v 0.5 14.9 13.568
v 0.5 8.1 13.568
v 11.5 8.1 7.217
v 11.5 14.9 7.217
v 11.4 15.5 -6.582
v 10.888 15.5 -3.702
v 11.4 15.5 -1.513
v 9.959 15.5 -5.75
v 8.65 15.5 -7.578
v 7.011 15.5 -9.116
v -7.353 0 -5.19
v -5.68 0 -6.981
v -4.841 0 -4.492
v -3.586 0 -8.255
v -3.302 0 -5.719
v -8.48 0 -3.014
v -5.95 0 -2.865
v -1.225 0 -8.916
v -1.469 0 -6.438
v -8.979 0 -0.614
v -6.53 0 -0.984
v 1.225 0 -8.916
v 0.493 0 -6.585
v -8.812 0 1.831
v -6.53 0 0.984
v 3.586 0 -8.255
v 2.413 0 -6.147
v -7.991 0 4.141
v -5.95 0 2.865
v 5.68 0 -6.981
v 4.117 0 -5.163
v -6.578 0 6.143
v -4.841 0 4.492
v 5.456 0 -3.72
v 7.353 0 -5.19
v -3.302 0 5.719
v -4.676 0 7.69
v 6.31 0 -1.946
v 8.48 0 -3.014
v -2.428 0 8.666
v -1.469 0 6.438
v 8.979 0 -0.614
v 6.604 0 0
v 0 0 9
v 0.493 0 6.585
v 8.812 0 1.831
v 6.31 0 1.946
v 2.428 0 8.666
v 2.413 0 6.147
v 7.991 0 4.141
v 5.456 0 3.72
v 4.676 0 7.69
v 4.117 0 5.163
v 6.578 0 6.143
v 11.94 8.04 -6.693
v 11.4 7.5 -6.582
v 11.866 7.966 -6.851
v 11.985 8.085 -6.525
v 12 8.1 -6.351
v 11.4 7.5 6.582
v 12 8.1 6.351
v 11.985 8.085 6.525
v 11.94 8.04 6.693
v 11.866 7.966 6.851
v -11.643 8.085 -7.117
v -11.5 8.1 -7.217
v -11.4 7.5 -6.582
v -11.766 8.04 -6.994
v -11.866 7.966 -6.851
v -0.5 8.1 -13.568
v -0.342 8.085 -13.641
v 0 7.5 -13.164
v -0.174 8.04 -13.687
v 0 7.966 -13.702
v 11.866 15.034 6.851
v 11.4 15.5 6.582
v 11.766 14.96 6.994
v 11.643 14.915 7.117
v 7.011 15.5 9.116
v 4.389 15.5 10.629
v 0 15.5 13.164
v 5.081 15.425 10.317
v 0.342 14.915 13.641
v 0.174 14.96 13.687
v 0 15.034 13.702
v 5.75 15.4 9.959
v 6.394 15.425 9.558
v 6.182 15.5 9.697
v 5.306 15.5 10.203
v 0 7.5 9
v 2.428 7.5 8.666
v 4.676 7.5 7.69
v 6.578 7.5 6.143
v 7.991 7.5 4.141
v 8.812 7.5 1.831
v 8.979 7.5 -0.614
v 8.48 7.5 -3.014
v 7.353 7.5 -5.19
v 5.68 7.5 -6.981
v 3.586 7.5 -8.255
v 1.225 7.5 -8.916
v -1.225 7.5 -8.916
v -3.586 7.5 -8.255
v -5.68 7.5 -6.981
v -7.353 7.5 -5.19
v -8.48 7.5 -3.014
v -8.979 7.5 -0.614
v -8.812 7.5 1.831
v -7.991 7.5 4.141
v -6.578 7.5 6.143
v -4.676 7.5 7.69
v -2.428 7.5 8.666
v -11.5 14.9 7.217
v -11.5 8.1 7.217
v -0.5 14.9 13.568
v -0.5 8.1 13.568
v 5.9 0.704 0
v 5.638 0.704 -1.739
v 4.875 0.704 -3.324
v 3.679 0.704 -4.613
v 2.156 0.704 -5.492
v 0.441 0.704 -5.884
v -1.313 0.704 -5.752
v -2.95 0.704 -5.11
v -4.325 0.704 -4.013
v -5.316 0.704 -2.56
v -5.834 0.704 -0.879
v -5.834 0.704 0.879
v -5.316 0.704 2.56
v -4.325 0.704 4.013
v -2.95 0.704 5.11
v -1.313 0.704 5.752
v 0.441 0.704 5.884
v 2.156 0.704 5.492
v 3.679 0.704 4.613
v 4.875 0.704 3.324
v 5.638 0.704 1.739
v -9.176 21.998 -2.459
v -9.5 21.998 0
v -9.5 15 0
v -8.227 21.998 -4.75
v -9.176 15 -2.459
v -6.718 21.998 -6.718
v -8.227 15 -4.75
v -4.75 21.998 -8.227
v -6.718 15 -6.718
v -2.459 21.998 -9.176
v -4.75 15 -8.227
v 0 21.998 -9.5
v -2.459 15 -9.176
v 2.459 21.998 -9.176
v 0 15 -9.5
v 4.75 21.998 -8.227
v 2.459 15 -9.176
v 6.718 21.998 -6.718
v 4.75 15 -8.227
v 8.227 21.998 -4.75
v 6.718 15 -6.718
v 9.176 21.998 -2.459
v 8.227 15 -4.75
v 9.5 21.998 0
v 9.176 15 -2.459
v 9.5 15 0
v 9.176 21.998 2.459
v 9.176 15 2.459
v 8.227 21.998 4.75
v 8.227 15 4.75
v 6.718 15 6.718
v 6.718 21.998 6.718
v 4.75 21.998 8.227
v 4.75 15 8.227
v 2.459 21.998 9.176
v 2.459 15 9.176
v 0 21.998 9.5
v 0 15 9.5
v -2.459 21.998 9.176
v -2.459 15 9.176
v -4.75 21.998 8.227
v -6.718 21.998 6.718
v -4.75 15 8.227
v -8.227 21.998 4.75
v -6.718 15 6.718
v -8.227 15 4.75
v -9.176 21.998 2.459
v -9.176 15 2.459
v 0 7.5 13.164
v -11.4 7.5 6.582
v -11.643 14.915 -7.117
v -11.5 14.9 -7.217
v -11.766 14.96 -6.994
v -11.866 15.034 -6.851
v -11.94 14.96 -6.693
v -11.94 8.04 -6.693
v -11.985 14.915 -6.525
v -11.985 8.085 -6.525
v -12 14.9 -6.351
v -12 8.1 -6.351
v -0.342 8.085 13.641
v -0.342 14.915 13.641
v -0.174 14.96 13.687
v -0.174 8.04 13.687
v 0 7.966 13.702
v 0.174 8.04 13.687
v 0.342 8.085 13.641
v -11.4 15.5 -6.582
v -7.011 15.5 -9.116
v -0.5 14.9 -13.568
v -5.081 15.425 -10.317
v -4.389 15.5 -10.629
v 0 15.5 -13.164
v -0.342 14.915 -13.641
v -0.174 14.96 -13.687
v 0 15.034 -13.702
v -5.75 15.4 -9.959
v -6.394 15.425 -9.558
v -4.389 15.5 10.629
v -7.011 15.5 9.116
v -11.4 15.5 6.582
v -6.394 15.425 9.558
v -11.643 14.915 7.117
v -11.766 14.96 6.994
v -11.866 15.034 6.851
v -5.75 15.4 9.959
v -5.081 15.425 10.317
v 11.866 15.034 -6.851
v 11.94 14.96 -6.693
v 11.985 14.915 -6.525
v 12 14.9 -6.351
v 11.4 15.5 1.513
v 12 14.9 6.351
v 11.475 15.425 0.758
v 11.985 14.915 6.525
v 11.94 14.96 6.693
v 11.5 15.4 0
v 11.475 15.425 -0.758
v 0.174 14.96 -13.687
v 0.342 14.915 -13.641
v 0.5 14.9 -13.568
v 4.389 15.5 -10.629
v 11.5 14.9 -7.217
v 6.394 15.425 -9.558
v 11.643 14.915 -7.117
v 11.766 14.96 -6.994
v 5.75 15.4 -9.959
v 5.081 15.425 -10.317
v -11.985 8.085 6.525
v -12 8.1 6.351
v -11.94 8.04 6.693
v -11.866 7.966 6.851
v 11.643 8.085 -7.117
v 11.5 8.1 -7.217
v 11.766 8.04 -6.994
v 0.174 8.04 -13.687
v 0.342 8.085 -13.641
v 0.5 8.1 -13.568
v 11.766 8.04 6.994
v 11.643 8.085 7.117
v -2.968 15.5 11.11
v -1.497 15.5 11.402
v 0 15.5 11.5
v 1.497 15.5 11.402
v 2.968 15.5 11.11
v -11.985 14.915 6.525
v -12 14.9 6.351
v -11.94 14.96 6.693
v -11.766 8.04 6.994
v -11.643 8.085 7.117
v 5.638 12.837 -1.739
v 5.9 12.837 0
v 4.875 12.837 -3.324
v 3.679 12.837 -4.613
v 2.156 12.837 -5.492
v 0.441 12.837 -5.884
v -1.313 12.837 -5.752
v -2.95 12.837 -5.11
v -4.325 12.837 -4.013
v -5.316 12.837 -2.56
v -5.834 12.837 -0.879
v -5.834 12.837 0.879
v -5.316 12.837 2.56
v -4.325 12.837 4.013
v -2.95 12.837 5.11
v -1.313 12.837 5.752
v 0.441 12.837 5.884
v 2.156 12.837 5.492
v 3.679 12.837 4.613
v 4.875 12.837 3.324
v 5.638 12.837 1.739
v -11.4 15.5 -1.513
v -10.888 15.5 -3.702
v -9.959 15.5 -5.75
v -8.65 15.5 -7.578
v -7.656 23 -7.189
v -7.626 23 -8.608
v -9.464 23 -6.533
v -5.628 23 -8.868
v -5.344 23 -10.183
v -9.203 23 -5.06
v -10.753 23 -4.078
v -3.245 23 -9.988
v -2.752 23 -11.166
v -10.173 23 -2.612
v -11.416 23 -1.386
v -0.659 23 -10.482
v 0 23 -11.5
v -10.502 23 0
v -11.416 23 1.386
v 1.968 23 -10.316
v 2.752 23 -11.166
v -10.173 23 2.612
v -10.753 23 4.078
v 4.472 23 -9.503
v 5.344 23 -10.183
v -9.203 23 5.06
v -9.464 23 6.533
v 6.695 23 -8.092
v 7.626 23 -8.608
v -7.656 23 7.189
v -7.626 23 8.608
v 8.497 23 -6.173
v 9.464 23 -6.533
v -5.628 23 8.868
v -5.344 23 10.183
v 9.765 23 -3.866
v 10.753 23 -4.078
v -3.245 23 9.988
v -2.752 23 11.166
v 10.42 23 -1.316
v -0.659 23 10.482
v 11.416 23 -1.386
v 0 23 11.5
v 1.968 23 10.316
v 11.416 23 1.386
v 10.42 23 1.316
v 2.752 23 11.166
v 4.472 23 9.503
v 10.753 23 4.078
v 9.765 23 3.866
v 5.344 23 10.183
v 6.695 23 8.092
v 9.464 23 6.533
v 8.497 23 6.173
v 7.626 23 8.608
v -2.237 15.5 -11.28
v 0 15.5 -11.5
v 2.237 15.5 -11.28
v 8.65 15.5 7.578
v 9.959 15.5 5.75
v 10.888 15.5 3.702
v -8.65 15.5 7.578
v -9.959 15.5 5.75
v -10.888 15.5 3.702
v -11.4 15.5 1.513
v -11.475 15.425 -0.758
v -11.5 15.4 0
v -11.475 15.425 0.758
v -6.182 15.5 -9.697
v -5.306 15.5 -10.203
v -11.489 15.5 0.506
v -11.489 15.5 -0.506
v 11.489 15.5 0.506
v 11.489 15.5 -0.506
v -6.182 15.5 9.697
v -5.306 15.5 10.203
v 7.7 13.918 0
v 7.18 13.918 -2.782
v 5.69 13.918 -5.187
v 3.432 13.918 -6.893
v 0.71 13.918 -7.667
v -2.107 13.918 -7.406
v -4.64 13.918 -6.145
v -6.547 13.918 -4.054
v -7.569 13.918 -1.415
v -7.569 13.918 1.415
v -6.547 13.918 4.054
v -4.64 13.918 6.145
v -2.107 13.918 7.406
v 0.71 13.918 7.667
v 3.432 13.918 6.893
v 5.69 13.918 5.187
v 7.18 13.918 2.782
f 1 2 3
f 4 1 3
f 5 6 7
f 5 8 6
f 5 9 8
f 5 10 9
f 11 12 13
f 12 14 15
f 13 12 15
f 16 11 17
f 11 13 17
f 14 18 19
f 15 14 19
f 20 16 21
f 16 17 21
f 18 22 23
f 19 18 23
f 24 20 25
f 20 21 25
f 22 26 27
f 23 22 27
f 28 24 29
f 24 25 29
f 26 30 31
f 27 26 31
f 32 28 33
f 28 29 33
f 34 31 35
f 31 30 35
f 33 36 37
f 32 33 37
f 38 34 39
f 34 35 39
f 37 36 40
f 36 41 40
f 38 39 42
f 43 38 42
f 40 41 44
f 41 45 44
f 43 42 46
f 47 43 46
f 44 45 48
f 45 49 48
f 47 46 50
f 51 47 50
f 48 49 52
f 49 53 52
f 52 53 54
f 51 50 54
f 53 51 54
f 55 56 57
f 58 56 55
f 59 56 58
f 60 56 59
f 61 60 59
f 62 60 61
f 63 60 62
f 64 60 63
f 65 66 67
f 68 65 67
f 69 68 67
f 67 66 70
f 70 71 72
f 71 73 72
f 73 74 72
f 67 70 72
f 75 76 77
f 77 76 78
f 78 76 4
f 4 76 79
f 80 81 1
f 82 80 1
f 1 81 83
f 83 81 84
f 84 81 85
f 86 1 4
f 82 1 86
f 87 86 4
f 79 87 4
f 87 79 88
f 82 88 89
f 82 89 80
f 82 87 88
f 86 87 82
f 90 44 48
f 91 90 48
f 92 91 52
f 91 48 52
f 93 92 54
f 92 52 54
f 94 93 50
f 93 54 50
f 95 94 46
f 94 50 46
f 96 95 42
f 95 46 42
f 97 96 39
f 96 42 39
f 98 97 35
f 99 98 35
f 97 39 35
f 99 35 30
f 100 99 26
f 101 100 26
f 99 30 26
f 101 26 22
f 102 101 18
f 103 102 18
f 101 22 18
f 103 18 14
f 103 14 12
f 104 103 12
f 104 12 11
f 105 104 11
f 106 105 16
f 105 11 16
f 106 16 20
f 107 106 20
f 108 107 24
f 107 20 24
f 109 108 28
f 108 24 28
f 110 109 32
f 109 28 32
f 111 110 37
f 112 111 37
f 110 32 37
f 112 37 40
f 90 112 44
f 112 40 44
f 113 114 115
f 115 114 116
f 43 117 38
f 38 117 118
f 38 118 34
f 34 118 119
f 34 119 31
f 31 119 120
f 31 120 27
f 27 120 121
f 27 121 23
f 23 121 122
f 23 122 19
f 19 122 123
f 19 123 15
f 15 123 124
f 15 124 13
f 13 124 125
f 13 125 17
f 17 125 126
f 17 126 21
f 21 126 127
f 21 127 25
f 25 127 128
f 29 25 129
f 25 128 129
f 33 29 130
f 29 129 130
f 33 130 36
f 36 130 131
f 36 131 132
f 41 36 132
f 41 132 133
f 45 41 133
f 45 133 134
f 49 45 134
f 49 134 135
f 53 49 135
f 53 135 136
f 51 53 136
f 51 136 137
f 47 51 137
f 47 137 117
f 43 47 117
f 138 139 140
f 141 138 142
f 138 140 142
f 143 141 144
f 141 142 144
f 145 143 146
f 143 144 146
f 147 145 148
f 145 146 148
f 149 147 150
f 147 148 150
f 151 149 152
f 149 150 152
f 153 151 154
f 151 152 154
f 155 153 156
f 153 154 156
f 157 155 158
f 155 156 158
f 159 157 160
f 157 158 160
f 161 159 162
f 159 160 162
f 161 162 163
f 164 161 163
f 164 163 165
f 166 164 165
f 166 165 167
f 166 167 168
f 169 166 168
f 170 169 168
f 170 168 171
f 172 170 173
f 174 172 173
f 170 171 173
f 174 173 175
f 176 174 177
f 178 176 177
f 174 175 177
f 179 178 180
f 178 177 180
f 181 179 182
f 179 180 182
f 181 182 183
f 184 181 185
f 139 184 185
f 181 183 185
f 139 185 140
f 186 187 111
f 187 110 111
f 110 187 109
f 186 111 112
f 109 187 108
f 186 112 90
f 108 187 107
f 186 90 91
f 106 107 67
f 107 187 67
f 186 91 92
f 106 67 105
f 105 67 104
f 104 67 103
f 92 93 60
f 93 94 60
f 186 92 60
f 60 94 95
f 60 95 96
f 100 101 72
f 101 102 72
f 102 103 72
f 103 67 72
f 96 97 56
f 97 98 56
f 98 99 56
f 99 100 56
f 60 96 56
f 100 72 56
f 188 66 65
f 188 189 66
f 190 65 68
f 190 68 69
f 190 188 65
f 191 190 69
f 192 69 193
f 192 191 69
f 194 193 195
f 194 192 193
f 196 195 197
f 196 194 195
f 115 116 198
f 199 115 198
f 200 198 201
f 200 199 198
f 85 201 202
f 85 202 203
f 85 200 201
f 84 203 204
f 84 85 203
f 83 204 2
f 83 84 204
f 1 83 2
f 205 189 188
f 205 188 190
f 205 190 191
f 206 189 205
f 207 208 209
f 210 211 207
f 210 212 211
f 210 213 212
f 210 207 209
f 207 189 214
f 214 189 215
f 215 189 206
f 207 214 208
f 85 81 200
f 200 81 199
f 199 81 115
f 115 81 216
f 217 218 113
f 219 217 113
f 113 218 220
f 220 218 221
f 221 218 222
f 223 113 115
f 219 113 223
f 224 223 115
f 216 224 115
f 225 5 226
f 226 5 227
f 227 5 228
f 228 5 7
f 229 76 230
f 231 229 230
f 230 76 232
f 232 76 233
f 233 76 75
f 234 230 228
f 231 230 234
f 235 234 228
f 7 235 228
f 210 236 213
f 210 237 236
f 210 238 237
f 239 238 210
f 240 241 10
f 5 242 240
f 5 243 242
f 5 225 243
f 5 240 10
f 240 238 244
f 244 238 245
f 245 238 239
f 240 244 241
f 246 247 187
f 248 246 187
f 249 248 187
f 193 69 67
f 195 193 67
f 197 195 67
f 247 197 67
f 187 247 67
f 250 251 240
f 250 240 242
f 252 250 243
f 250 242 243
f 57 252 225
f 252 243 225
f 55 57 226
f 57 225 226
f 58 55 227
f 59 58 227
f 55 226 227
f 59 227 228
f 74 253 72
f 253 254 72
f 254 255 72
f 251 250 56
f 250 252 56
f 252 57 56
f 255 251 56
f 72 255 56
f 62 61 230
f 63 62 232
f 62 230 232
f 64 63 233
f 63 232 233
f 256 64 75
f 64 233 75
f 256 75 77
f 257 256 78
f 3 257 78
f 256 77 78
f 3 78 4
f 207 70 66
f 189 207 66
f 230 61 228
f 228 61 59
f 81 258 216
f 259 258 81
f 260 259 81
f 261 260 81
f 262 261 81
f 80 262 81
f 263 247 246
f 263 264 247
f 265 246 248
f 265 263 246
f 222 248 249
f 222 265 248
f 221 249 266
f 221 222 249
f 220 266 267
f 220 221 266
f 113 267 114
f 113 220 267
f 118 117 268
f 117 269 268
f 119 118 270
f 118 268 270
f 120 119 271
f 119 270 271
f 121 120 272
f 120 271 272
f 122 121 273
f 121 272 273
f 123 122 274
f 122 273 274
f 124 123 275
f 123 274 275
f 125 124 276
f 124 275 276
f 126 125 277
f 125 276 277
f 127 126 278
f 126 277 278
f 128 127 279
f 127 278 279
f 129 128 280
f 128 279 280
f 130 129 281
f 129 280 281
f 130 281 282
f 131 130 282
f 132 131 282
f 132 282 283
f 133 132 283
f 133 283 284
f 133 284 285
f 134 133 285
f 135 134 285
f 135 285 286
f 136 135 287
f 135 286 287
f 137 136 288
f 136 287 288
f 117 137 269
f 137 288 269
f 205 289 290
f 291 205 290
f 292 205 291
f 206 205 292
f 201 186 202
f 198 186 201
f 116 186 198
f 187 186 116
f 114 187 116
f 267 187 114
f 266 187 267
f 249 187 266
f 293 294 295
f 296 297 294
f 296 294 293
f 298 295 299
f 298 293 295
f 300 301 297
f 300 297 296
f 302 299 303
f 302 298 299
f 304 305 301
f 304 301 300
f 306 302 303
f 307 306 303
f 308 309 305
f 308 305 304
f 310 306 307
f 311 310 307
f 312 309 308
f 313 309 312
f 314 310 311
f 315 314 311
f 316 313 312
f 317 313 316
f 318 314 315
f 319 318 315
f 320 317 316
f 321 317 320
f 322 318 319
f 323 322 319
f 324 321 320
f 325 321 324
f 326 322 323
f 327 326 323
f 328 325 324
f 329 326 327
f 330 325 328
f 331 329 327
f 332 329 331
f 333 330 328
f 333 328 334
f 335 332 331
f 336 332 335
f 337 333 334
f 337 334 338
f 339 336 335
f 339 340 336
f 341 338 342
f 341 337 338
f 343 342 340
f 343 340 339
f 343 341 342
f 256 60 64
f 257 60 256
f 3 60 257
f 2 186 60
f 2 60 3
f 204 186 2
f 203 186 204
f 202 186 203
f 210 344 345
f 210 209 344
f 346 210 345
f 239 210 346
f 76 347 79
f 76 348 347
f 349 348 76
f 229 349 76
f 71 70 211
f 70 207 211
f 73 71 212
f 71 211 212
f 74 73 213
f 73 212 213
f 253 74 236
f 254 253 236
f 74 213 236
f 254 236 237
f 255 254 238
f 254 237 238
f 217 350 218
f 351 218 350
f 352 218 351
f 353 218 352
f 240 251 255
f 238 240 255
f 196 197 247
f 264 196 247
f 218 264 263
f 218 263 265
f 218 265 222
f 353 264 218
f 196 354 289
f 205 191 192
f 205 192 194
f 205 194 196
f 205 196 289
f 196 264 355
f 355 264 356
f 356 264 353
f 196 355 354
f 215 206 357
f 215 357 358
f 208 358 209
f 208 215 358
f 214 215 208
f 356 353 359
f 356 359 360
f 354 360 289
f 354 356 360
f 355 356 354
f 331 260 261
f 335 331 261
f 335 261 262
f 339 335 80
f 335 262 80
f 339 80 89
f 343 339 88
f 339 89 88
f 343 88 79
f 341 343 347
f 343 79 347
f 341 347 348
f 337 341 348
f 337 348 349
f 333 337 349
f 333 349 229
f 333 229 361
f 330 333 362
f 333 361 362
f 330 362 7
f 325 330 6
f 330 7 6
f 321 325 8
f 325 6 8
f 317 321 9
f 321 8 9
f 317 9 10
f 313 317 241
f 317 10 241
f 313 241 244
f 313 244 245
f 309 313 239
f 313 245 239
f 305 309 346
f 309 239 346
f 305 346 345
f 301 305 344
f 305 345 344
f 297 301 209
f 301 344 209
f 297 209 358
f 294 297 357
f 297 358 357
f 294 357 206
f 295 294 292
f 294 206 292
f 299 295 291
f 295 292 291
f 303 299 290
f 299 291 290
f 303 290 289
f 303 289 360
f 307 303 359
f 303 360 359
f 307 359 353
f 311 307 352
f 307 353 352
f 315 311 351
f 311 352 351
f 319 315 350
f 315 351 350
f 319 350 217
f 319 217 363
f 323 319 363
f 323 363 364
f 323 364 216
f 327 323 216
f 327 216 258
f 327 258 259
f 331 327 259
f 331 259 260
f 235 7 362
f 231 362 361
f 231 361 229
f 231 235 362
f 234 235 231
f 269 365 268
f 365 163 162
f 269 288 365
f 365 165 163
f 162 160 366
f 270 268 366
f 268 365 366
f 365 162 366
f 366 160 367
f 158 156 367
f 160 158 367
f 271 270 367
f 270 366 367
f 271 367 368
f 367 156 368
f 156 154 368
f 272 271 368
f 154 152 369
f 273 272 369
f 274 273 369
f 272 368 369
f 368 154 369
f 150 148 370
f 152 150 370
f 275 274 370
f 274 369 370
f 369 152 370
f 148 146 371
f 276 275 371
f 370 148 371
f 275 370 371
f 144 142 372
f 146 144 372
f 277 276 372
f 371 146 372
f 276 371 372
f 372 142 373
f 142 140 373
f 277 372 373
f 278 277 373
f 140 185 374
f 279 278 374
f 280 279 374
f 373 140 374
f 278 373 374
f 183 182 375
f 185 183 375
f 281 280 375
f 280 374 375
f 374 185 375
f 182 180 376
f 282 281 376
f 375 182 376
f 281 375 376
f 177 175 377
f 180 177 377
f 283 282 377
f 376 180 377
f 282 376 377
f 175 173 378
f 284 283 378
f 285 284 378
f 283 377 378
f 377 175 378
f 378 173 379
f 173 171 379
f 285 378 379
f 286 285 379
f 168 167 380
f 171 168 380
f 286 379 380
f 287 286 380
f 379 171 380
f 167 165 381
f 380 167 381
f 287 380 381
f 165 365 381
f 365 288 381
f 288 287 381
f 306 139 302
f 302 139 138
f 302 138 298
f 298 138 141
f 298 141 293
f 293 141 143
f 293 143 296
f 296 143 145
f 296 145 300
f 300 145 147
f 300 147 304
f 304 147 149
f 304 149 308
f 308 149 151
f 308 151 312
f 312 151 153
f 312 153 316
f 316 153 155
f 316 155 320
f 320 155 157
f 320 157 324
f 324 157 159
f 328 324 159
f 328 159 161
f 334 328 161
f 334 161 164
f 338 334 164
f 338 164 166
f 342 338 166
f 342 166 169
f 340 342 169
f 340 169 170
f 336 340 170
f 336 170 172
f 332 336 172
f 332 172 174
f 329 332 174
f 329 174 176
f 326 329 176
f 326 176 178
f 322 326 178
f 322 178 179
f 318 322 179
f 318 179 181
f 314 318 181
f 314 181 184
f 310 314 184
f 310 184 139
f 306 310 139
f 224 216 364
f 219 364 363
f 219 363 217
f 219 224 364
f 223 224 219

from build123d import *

# Parameters (mm, degrees)
SKETCH_1_R                    = 9
EXTRUDE_1_DEPTH               = 7.5
EXTRUDE_2_DEPTH               = 8
SKETCH_3_R                    = 11.5
EXTRUDE_3_DEPTH               = 7.5
CHAMFER_2_SIZE                = 0.6
FILLET_1_R                    = 1
HOLE_WIZARD_G1_22_D           = 19
HOLE_WIZARD_G1_22_DEPTH       = 8
HOLE_WIZARD_G1_22_CSINK_D     = 21.005
HOLE_WIZARD_G1_22_CSINK_ANGLE = 90
HOLE_WIZARD_G1_22_TIP         = 5.708175880761822
HOLE_WIZARD_G1_41_D           = 11.8
HOLE_WIZARD_G1_41_DEPTH       = 30.32
HOLE_WIZARD_G1_41_CSINK_D     = 13.207
HOLE_WIZARD_G1_41_CSINK_ANGLE = 90
HOLE_WIZARD_G1_41_TIP         = 3.5450776522626057


with BuildPart() as part:
    # Эскиз1 → Бобышка-Вытянуть1 (new body)
    with BuildSketch(Plane(origin=(0, 0, 0), x_dir=(1, 0, 0), z_dir=(0, 1, 0))):
        with Locations(Location((0, 0, 0), (0, 0, 270))):
            Circle(SKETCH_1_R)
    extrude(amount=EXTRUDE_1_DEPTH)

    # Эскиз2 → Бобышка-Вытянуть2 (add)
    with BuildSketch(Plane(origin=(0, 7.5, 0), x_dir=(1, 0, 0), z_dir=(0, 1, 0))):
        Polygon((-3.47e-15, 13.856406460551018), (-12, 6.92820323027551), (-11.999999999999996, -6.9282032302755105), (1.63e-15, -13.856406460551016), (12, -6.928203230275508), (11.999999999999993, 6.928203230275516), align=None)
    extrude(amount=EXTRUDE_2_DEPTH)

    # Эскиз3 → Бобышка-Вытянуть3 (add)
    with BuildSketch(Plane(origin=(0, 15.5, 0), x_dir=(1, 0, 0), z_dir=(0, 1, 0))):
        with Locations(Location((0, 0, 0), (0, 0, 270))):
            Circle(SKETCH_3_R)
    extrude(amount=EXTRUDE_3_DEPTH)

    # Фаска2
    # the kernel refuses this chamfer: 0.6 mm, written as the material it takes off along each edge
    with BuildSketch(Plane(origin=(13.336285678835246, 7.5, -6.156698333885741), x_dir=(0.01374793830529287, 0.9996219169112968, -0.023812127644089635), z_dir=(-0.8660254037844389, 0, -0.4999999999999997))) as chamfer_2_piece_1:
        Polygon((CHAMFER_2_SIZE * 0.999621916911, -CHAMFER_2_SIZE * 0.0274958766106), (-CHAMFER_2_SIZE * 0.0274958766106, -CHAMFER_2_SIZE * 0.999621916911), (0, 0), align=None)
    extrude(amount=16.942426046110114, mode=Mode.SUBTRACT)
    with BuildSketch(Plane(origin=(1.3362856788352484, 7.5, -14.627911356940793), x_dir=(-0.013747938305293587, 0.9996219169112968, -0.023812127644090856), z_dir=(-0.8660254037844387, 0, 0.5000000000000001))) as chamfer_2_piece_2:
        Polygon((CHAMFER_2_SIZE * 0.999621916911, -CHAMFER_2_SIZE * 0.0274958766106), (-CHAMFER_2_SIZE * 0.0274958766106, -CHAMFER_2_SIZE * 0.999621916911), (0, 0), align=None)
    extrude(amount=16.942426046110114, mode=Mode.SUBTRACT)
    with BuildSketch(Plane(origin=(-12, 7.5, -8.471213023055057), x_dir=(-0.027495876610587344, 0.9996219169112968, 0), z_dir=(2.6e-16, 0, 1))) as chamfer_2_piece_3:
        Polygon((CHAMFER_2_SIZE * 0.999621916911, -CHAMFER_2_SIZE * 0.0274958766106), (-CHAMFER_2_SIZE * 0.0274958766106, -CHAMFER_2_SIZE * 0.999621916911), (0, 0), align=None)
    extrude(amount=16.942426046110118, mode=Mode.SUBTRACT)
    with BuildSketch(Plane(origin=(-13.33628567883525, 7.5, 6.1566983338857355), x_dir=(0.4998109584556482, -0.027495876610585928, -0.8656979742248805), z_dir=(0.8660254037844387, 0, 0.49999999999999983))) as chamfer_2_piece_4:
        Polygon((CHAMFER_2_SIZE * 0.999621916911, CHAMFER_2_SIZE * 0.0274958766106), (-CHAMFER_2_SIZE * 0.0274958766106, CHAMFER_2_SIZE * 0.999621916911), (0, 0), align=None)
    extrude(amount=16.942426046110118, mode=Mode.SUBTRACT)
    with BuildSketch(Plane(origin=(-1.3362856788352513, 7.5, 14.62791135694079), x_dir=(-0.49981095845564827, -0.027495876610585855, -0.8656979742248804), z_dir=(0.8660254037844387, 0, -0.5))) as chamfer_2_piece_5:
        Polygon((CHAMFER_2_SIZE * 0.999621916911, CHAMFER_2_SIZE * 0.0274958766106), (-CHAMFER_2_SIZE * 0.0274958766106, CHAMFER_2_SIZE * 0.999621916911), (0, 0), align=None)
    extrude(amount=16.942426046110114, mode=Mode.SUBTRACT)
    with BuildSketch(Plane(origin=(12, 7.5, 8.471213023055055), x_dir=(-0.9996219169112968, -0.027495876610585904, 0), z_dir=(-5.1e-16, 0, -1))) as chamfer_2_piece_6:
        Polygon((CHAMFER_2_SIZE * 0.999621916911, CHAMFER_2_SIZE * 0.0274958766106), (-CHAMFER_2_SIZE * 0.0274958766106, CHAMFER_2_SIZE * 0.999621916911), (0, 0), align=None)
    extrude(amount=16.94242604611012, mode=Mode.SUBTRACT)
    with BuildSketch(Plane(origin=(13.336285678835246, 15.5, -6.156698333885741), x_dir=(0.01374793830529287, -0.9996219169112968, -0.023812127644089635), z_dir=(-0.8660254037844389, 0, -0.4999999999999997))) as chamfer_2_piece_7_section:
        Polygon((CHAMFER_2_SIZE * 0.999621916911, CHAMFER_2_SIZE * 0.0274958766106), (-CHAMFER_2_SIZE * 0.0274958766106, CHAMFER_2_SIZE * 0.999621916911), (0, 0), align=None)
    chamfer_2_piece_7 = extrude(amount=16.942426046110114, mode=Mode.PRIVATE)
    chamfer_2_piece_7 = chamfer_2_piece_7 - Plane(origin=(0, 15.301333740559118, 0), x_dir=(-1.8e-16, 0, 1), z_dir=(0, -1, 0)) * Cylinder(11.5, 37, mode=Mode.PRIVATE)
    add(chamfer_2_piece_7, mode=Mode.SUBTRACT)
    with BuildSketch(Plane(origin=(1.3362856788352486, 15.5, -14.627911356940793), x_dir=(-0.013747938305293677, -0.9996219169112968, -0.02381212764409101), z_dir=(-0.8660254037844387, 0, 0.5000000000000001))) as chamfer_2_piece_8_section:
        Polygon((CHAMFER_2_SIZE * 0.999621916911, CHAMFER_2_SIZE * 0.0274958766106), (-CHAMFER_2_SIZE * 0.0274958766106, CHAMFER_2_SIZE * 0.999621916911), (0, 0), align=None)
    chamfer_2_piece_8 = extrude(amount=16.942426046110118, mode=Mode.PRIVATE)
    chamfer_2_piece_8 = chamfer_2_piece_8 - Plane(origin=(0, 15.30133374055918, 0), x_dir=(-1.8e-16, 0, 1), z_dir=(0, -1, 0)) * Cylinder(11.5, 37, mode=Mode.PRIVATE)
    add(chamfer_2_piece_8, mode=Mode.SUBTRACT)
    with BuildSketch(Plane(origin=(-12, 15.5, -8.471213023055057), x_dir=(-0.027495876610587344, -0.9996219169112968, 0), z_dir=(2.6e-16, 0, 1))) as chamfer_2_piece_9_section:
        Polygon((CHAMFER_2_SIZE * 0.999621916911, CHAMFER_2_SIZE * 0.0274958766106), (-CHAMFER_2_SIZE * 0.0274958766106, CHAMFER_2_SIZE * 0.999621916911), (0, 0), align=None)
    chamfer_2_piece_9 = extrude(amount=16.942426046110118, mode=Mode.PRIVATE)
    chamfer_2_piece_9 = chamfer_2_piece_9 - Plane(origin=(0, 15.301333740559167, 0), x_dir=(-1.8e-16, 0, 1), z_dir=(0, -1, 0)) * Cylinder(11.5, 37, mode=Mode.PRIVATE)
    add(chamfer_2_piece_9, mode=Mode.SUBTRACT)
    with BuildSketch(Plane(origin=(-13.33628567883525, 15.5, 6.1566983338857355), x_dir=(0.4998109584556481, 0.02749587661058736, -0.8656979742248804), z_dir=(0.8660254037844387, 0, 0.49999999999999983))) as chamfer_2_piece_10_section:
        Polygon((CHAMFER_2_SIZE * 0.999621916911, -CHAMFER_2_SIZE * 0.0274958766106), (-CHAMFER_2_SIZE * 0.0274958766106, -CHAMFER_2_SIZE * 0.999621916911), (0, 0), align=None)
    chamfer_2_piece_10 = extrude(amount=16.942426046110118, mode=Mode.PRIVATE)
    chamfer_2_piece_10 = chamfer_2_piece_10 - Plane(origin=(0, 15.301333740442608, 0), x_dir=(-1.8e-16, 0, 1), z_dir=(0, -1, 0)) * Cylinder(11.5, 37, mode=Mode.PRIVATE)
    add(chamfer_2_piece_10, mode=Mode.SUBTRACT)
    with BuildSketch(Plane(origin=(-1.336285678835251, 15.5, 14.62791135694079), x_dir=(-0.49981095845564827, 0.02749587661058729, -0.8656979742248804), z_dir=(0.8660254037844387, 0, -0.5))) as chamfer_2_piece_11_section:
        Polygon((CHAMFER_2_SIZE * 0.999621916911, -CHAMFER_2_SIZE * 0.0274958766106), (-CHAMFER_2_SIZE * 0.0274958766106, -CHAMFER_2_SIZE * 0.999621916911), (0, 0), align=None)
    chamfer_2_piece_11 = extrude(amount=16.94242604611012, mode=Mode.PRIVATE)
    chamfer_2_piece_11 = chamfer_2_piece_11 - Plane(origin=(0, 15.301333740442338, 0), x_dir=(-1.8e-16, 0, 1), z_dir=(0, -1, 0)) * Cylinder(11.5, 37, mode=Mode.PRIVATE)
    add(chamfer_2_piece_11, mode=Mode.SUBTRACT)
    with BuildSketch(Plane(origin=(12, 15.5, 8.471213023055055), x_dir=(-0.9996219169112968, 0.027495876610587344, 0), z_dir=(-5.1e-16, 0, -1))) as chamfer_2_piece_12_section:
        Polygon((CHAMFER_2_SIZE * 0.999621916911, -CHAMFER_2_SIZE * 0.0274958766106), (-CHAMFER_2_SIZE * 0.0274958766106, -CHAMFER_2_SIZE * 0.999621916911), (0, 0), align=None)
    chamfer_2_piece_12 = extrude(amount=16.94242604611012, mode=Mode.PRIVATE)
    chamfer_2_piece_12 = chamfer_2_piece_12 - Plane(origin=(0, 15.301333740442368, 0), x_dir=(-1.8e-16, 0, 1), z_dir=(0, -1, 0)) * Cylinder(11.5, 37, mode=Mode.PRIVATE)
    add(chamfer_2_piece_12, mode=Mode.SUBTRACT)

    # Скругление1
    fillet_1_edges = [part.edges().sort_by_distance(p)[0] for p in [
        (-3.47e-15, 11.5, -13.856406460551018),
        (11.999999999999993, 11.5, -6.928203230275516),
        (12, 11.5, 6.928203230275508),
        (1.63e-15, 11.5, 13.856406460551016),
        (-11.999999999999996, 11.5, 6.9282032302755105),
        (-12, 11.5, -6.92820323027551),
    ]]
    fillet(fillet_1_edges, radius=FILLET_1_R)

    # Отверстие обработанное метчиком G1/22
    with Locations(Plane(origin=(0, 23, 0), x_dir=(1, 0, 0), z_dir=(0, 1, 0))):
        with Locations((0, 0)):
            CounterSinkHole(HOLE_WIZARD_G1_22_D / 2, HOLE_WIZARD_G1_22_CSINK_D / 2, depth=HOLE_WIZARD_G1_22_DEPTH, counter_sink_angle=HOLE_WIZARD_G1_22_CSINK_ANGLE)
            with Locations((0, 0, -(HOLE_WIZARD_G1_22_DEPTH + HOLE_WIZARD_G1_22_TIP / 2))):  # 118° drill point
                Cone(0, HOLE_WIZARD_G1_22_D / 2, HOLE_WIZARD_G1_22_TIP, mode=Mode.SUBTRACT)

    # Отверстие обработанное метчиком G1/41
    with Locations(Plane(origin=(0, 0, 0), x_dir=(-1, 0, 0), z_dir=(0, -1, 0))):
        with Locations((0, 0)):
            CounterSinkHole(HOLE_WIZARD_G1_41_D / 2, HOLE_WIZARD_G1_41_CSINK_D / 2, depth=HOLE_WIZARD_G1_41_DEPTH, counter_sink_angle=HOLE_WIZARD_G1_41_CSINK_ANGLE)
            with Locations((0, 0, -(HOLE_WIZARD_G1_41_DEPTH + HOLE_WIZARD_G1_41_TIP / 2))):  # 118° drill point
                Cone(0, HOLE_WIZARD_G1_41_D / 2, HOLE_WIZARD_G1_41_TIP, mode=Mode.SUBTRACT)


solid = part.part
